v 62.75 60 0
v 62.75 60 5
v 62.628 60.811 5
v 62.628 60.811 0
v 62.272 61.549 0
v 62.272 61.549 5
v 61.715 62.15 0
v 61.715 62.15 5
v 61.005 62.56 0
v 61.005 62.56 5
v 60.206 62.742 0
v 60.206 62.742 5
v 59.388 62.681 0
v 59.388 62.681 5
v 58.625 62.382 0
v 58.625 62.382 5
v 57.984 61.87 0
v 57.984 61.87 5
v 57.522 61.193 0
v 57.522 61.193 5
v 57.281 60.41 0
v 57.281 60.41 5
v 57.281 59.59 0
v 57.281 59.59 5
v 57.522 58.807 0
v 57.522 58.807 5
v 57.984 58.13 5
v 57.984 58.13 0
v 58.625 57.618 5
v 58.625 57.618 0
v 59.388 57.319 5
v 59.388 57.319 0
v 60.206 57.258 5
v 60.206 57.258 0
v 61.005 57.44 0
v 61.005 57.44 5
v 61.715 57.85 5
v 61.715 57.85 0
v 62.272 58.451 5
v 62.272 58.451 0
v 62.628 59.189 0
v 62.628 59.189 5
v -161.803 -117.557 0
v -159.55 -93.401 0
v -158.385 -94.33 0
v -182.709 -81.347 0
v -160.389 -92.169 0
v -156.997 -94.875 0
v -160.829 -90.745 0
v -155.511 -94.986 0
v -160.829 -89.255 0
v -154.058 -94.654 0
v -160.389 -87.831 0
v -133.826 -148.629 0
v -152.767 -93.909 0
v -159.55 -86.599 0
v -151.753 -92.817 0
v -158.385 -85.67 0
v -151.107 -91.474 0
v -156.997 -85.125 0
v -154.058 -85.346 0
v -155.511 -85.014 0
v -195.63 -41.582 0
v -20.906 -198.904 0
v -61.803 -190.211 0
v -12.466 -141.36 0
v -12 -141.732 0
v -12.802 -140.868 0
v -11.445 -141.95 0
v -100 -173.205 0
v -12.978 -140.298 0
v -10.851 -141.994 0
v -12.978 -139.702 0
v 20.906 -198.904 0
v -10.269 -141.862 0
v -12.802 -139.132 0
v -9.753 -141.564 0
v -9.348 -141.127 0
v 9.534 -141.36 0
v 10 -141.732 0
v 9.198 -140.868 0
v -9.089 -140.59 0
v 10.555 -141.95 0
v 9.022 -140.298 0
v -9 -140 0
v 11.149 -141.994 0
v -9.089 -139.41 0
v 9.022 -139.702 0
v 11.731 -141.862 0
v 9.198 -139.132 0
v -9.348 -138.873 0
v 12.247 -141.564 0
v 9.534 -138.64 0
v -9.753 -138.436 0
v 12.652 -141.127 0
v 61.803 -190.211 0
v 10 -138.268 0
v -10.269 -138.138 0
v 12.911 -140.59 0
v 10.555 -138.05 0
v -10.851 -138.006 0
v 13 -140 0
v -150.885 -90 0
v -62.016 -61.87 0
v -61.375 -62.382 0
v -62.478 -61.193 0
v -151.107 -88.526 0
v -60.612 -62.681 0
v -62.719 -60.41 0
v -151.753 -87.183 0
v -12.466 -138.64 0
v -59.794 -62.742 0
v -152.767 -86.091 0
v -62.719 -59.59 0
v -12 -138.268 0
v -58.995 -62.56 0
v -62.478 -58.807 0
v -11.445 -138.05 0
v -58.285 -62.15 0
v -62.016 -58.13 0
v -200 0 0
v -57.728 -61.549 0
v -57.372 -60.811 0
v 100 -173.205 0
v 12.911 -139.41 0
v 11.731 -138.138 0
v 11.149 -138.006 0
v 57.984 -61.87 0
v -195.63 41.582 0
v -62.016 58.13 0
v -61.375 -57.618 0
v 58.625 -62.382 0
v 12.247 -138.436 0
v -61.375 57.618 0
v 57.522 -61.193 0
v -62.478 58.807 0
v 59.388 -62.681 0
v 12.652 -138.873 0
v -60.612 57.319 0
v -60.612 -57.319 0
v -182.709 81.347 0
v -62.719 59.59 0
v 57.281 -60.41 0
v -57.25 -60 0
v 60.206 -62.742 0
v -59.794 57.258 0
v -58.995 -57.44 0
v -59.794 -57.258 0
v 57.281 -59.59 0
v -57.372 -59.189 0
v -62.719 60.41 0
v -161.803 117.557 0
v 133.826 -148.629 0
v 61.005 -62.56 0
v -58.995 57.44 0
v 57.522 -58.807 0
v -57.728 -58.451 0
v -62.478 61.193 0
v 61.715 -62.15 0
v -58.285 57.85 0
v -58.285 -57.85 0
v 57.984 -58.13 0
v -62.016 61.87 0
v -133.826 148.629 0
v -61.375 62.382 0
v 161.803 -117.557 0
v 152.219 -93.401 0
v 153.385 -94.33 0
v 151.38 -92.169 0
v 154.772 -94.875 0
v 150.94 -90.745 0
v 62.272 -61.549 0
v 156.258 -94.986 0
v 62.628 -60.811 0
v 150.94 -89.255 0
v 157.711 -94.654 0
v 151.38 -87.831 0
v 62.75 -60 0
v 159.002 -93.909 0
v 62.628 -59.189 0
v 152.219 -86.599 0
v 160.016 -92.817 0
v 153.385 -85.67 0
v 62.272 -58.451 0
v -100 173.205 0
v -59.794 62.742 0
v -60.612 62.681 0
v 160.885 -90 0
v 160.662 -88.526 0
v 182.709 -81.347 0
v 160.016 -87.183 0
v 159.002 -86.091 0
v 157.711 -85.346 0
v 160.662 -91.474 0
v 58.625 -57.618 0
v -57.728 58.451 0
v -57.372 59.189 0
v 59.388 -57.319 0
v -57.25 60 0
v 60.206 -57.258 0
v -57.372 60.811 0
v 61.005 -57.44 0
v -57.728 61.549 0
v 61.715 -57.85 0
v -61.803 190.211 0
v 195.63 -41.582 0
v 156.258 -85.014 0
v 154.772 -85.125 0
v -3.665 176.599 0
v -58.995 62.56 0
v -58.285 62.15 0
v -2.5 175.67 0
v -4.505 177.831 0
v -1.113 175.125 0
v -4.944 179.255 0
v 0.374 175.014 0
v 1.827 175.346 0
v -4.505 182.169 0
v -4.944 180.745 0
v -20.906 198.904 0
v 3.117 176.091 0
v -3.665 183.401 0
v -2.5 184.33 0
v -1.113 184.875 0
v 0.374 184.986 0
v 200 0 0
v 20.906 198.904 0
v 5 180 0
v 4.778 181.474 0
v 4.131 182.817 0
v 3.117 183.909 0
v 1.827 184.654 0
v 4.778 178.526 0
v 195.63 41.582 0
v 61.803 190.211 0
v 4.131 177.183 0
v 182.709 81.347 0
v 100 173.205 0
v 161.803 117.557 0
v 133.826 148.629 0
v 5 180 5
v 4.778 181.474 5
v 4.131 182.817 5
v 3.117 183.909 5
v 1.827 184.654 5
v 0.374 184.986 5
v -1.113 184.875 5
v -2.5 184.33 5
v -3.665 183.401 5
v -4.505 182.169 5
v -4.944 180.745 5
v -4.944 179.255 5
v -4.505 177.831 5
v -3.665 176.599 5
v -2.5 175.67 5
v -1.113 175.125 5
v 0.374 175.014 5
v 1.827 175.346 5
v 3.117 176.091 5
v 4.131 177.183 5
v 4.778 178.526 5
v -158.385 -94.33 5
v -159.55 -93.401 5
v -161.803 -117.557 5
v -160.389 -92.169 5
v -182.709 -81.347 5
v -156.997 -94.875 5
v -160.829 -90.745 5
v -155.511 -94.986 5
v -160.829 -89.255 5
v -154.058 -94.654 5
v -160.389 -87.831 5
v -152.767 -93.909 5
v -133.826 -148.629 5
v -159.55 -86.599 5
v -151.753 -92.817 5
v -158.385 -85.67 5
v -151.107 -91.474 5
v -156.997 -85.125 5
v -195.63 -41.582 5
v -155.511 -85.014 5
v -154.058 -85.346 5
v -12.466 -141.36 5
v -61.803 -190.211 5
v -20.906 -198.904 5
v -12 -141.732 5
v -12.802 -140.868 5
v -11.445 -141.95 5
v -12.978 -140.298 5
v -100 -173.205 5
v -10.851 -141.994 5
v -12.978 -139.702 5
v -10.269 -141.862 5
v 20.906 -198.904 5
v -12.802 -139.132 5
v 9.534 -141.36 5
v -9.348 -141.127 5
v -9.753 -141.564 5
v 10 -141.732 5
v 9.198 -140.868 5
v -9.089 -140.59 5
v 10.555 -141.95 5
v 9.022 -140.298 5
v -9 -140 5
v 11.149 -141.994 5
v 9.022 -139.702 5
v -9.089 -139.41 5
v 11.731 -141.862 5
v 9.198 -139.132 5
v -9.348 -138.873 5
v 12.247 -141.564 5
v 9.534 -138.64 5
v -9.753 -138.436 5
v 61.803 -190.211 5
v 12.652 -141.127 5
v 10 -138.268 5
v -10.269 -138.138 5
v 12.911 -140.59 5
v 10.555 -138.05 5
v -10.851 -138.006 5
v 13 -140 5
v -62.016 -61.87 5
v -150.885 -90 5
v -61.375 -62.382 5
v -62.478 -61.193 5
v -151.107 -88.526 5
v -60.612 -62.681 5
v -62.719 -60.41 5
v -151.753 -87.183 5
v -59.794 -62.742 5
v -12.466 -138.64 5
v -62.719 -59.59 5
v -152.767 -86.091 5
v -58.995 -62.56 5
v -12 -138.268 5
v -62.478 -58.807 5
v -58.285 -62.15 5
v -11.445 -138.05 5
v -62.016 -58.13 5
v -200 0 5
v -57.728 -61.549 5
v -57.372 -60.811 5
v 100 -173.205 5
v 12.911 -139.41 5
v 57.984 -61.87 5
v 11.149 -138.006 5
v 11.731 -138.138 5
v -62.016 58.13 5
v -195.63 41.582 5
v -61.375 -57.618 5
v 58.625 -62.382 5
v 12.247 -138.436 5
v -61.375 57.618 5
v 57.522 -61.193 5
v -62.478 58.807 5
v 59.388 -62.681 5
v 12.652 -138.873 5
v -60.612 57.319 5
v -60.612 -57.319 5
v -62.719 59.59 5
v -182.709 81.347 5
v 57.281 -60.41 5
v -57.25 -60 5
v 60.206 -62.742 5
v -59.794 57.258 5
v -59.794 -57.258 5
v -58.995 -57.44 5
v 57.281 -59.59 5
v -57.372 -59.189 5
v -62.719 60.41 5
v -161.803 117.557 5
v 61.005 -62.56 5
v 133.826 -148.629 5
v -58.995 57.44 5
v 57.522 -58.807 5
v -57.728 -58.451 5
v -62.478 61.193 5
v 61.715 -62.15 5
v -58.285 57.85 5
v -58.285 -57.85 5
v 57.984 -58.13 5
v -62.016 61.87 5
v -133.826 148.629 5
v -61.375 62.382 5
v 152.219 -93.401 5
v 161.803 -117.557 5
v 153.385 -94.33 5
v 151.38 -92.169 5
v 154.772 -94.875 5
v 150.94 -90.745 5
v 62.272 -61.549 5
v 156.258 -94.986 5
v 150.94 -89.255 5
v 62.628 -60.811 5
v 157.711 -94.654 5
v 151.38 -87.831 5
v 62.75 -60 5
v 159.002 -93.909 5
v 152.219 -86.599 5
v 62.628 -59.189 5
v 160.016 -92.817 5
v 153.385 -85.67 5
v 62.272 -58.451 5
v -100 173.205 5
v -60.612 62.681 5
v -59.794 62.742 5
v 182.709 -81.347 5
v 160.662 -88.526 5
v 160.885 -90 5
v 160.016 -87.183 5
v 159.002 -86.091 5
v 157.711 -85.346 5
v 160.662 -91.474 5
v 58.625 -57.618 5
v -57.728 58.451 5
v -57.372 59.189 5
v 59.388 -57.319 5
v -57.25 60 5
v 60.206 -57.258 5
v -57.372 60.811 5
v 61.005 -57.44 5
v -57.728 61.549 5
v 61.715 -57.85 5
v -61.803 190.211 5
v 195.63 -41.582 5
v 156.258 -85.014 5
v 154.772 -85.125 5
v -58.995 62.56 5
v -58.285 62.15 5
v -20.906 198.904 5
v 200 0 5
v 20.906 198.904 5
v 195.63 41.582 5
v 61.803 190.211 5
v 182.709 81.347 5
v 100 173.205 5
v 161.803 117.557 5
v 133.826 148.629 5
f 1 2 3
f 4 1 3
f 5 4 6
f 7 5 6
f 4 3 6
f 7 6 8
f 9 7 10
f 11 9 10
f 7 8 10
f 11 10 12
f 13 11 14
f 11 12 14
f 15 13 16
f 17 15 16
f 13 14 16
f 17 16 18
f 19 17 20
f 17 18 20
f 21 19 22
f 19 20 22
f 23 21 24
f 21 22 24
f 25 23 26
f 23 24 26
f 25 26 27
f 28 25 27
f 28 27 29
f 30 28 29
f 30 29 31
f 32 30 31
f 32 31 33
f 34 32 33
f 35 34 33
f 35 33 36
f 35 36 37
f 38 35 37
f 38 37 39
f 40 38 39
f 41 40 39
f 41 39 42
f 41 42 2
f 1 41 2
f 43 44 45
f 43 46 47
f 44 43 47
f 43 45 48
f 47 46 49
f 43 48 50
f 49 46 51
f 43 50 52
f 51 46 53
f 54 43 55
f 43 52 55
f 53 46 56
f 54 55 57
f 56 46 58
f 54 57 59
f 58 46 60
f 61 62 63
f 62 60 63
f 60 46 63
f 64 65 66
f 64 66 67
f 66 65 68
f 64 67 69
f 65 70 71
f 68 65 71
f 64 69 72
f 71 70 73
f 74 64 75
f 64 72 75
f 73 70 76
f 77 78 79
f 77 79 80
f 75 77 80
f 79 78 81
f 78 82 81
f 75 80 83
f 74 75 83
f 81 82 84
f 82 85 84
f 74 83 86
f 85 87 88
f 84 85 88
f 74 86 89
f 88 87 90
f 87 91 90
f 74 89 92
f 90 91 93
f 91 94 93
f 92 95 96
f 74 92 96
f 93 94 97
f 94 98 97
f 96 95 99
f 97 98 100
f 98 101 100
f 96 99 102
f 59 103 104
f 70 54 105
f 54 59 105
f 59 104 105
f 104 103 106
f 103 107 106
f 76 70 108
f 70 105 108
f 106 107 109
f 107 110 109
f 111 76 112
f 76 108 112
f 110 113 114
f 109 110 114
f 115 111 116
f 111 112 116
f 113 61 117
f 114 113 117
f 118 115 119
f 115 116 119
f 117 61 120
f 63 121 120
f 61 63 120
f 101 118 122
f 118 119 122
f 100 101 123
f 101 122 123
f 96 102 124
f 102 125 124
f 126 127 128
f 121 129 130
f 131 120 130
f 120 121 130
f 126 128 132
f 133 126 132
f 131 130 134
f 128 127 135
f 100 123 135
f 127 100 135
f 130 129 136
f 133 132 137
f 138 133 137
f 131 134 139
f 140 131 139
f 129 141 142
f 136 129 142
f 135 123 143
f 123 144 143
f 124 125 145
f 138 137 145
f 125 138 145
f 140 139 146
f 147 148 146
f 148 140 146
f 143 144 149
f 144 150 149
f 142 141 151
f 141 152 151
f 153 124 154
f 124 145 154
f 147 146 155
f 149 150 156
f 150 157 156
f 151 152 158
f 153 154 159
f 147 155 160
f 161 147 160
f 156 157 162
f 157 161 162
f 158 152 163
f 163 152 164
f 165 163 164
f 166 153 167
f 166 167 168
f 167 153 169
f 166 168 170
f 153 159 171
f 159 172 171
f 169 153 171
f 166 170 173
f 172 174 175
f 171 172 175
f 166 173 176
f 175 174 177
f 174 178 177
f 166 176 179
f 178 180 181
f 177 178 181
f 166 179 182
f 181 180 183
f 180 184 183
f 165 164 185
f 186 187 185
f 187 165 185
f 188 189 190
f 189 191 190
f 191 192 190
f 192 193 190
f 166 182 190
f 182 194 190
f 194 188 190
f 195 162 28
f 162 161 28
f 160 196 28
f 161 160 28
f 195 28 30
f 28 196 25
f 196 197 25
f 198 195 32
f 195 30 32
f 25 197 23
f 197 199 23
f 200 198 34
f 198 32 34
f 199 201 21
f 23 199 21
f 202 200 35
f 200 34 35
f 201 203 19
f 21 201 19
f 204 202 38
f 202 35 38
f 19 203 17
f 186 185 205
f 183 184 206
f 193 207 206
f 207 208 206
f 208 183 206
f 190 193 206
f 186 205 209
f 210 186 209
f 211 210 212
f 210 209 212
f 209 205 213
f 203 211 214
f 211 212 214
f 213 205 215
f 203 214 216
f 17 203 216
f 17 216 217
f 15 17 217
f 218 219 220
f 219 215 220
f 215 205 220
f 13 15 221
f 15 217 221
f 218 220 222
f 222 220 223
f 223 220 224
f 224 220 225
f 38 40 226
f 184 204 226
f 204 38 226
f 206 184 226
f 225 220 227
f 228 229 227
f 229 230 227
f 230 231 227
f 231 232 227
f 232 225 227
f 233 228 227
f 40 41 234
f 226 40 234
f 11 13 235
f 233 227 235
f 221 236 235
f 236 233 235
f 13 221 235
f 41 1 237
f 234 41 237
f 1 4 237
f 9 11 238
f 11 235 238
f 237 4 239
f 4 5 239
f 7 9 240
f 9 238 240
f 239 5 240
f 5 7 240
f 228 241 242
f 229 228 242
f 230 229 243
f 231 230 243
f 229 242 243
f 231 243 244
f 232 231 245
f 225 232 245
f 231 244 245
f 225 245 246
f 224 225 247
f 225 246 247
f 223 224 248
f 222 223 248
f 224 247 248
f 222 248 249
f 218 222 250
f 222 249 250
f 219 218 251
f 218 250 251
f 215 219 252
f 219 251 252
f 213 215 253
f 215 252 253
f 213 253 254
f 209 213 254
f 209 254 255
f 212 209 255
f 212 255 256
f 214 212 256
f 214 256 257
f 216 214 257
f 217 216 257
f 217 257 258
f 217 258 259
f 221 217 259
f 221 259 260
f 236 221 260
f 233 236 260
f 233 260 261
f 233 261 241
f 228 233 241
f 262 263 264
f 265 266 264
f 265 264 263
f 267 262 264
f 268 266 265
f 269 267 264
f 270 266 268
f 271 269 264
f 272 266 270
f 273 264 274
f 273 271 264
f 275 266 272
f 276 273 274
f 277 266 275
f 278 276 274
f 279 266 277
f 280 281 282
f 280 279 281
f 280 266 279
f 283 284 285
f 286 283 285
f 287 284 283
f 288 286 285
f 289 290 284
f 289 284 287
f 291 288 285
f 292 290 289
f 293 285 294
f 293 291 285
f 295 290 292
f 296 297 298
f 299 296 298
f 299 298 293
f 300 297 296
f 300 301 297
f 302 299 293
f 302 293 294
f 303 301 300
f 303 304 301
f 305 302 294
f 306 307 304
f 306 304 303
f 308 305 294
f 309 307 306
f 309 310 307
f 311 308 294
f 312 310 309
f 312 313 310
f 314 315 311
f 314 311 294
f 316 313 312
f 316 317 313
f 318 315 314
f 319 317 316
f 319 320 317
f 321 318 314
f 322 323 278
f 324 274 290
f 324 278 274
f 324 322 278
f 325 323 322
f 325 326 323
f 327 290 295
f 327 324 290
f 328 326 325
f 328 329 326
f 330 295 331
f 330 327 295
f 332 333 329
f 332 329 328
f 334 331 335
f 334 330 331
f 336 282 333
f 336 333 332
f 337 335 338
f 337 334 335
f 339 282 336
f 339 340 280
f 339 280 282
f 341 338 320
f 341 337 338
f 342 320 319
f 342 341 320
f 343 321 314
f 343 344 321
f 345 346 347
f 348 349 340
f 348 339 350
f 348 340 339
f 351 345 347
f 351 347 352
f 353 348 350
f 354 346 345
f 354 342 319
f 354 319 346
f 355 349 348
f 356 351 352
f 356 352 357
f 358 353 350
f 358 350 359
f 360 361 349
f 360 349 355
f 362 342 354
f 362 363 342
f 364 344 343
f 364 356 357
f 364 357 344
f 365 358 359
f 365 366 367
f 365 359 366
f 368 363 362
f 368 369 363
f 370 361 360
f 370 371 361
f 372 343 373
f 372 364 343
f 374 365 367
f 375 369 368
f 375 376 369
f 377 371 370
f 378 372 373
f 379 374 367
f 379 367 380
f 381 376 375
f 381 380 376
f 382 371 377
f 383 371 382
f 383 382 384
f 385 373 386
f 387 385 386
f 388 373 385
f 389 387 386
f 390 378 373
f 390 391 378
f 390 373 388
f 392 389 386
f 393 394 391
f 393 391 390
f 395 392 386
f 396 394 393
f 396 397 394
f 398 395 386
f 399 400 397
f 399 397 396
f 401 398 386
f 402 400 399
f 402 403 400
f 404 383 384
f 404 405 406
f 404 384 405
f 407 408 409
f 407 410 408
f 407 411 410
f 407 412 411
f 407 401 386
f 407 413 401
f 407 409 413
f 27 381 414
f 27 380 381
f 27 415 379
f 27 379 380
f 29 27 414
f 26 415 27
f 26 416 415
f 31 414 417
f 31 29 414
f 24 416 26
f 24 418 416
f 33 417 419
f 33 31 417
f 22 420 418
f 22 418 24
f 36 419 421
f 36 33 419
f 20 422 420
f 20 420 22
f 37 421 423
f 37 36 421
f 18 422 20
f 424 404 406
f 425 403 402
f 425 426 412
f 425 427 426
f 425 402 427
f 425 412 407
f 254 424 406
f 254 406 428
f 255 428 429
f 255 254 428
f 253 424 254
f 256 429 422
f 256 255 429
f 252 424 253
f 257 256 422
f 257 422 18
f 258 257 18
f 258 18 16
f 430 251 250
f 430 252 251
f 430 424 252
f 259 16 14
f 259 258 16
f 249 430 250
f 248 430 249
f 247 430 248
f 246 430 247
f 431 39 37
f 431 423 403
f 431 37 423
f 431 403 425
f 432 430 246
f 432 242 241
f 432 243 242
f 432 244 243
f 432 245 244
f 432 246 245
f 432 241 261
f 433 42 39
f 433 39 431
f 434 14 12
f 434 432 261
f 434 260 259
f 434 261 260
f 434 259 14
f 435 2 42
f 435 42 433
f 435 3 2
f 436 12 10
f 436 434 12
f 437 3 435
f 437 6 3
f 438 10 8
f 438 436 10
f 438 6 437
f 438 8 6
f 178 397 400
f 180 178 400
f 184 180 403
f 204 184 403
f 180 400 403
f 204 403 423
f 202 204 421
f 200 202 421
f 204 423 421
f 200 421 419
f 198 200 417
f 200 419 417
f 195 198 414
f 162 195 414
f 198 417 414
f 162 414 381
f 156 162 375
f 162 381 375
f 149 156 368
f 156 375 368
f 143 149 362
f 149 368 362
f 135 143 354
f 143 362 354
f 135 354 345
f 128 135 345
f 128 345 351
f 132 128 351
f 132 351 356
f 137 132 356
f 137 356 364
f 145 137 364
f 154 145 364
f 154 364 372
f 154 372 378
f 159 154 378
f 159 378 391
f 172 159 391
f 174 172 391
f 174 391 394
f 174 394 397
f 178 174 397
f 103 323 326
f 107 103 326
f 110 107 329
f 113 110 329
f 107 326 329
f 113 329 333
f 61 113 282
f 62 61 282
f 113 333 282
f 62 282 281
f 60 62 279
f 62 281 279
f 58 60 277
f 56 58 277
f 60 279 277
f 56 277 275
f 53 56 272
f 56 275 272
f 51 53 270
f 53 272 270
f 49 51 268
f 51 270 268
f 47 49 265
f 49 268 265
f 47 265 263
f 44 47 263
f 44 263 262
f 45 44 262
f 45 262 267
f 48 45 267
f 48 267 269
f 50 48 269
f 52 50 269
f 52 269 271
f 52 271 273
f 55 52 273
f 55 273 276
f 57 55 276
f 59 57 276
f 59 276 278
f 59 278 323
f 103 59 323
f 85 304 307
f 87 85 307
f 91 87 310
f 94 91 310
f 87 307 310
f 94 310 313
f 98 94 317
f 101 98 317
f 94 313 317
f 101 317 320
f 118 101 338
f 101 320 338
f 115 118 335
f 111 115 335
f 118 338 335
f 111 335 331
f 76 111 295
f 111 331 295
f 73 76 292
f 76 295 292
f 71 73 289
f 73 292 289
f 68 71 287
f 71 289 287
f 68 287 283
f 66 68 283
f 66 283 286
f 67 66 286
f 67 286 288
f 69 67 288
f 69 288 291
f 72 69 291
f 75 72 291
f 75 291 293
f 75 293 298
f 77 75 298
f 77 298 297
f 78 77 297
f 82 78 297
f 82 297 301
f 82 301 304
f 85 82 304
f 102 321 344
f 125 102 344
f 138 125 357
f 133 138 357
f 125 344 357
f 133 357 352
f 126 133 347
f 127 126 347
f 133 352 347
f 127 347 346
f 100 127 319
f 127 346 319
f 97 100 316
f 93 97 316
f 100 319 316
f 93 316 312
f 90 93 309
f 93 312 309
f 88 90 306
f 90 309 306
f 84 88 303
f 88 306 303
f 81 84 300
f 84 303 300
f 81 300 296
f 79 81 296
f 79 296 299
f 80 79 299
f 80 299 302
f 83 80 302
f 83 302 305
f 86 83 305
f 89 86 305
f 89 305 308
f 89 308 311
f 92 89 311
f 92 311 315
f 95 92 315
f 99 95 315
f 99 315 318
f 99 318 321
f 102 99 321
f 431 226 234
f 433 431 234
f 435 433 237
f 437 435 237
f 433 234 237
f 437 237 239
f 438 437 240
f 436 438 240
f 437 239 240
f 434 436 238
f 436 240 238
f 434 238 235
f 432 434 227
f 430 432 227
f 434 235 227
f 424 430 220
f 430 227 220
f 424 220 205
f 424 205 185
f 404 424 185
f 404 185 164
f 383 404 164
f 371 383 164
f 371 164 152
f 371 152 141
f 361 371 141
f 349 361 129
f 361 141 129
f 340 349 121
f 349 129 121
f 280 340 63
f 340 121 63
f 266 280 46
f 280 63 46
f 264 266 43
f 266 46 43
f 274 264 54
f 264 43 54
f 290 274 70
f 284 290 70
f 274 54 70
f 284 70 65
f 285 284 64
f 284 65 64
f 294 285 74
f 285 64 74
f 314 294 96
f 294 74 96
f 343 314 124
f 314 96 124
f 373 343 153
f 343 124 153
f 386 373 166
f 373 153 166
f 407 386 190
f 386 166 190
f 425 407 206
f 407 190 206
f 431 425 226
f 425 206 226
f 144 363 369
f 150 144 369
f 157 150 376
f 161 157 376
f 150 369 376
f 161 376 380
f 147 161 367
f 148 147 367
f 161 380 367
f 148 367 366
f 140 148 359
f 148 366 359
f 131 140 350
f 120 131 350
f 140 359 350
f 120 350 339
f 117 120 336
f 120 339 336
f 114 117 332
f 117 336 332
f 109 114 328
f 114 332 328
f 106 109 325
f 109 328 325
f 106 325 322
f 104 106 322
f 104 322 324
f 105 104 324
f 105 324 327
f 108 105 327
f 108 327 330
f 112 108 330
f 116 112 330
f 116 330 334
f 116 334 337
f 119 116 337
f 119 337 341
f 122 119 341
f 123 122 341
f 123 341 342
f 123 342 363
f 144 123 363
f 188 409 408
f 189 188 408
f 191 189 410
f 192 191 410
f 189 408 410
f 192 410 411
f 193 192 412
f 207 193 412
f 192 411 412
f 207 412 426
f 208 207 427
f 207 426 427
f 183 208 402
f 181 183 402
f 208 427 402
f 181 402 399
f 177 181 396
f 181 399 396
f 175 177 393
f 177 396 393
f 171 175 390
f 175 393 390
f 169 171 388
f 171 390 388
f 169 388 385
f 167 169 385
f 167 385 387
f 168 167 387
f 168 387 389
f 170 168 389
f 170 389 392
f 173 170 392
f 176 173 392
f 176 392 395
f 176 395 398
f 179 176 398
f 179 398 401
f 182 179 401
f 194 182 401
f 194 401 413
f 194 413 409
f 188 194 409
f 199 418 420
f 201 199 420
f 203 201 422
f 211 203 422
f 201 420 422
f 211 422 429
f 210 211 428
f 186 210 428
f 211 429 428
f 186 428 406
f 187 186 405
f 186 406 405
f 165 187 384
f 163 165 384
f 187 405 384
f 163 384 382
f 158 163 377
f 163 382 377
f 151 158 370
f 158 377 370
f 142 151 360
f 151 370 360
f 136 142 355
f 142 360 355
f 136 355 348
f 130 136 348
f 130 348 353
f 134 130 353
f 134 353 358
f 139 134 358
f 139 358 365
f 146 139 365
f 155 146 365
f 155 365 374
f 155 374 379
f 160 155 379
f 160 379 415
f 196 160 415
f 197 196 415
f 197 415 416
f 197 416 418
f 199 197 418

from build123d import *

# Parameters (mm, degrees)
SKETCH1_R           = 200
BOSS_EXTRUDE1_DEPTH = 5
CUT_EXTRUDE1_REACH  = 7
SKETCH2_R           = 5
CUT_EXTRUDE2_REACH  = 7
SKETCH3_R           = 2.75
CUT_EXTRUDE3_REACH  = 7
SKETCH4_R           = 2


with BuildPart() as part:
    # Sketch1 → Boss-Extrude1 (new body)
    with BuildSketch(Plane.XY):
        Circle(SKETCH1_R)
    extrude(amount=BOSS_EXTRUDE1_DEPTH)

    # Sketch2 → Cut-Extrude1 (cut, up to next)
    with BuildSketch(Plane.XY.offset(5), mode=Mode.PRIVATE) as cut_extrude1_sk1:
        with Locations((0, 180)):
            Circle(SKETCH2_R)
    cut_extrude1_tool1 = extrude(cut_extrude1_sk1.sketch, amount=-CUT_EXTRUDE1_REACH, mode=Mode.PRIVATE) & part.part
    add(cut_extrude1_tool1.solids().sort_by_distance((0, 180, 5))[0], mode=Mode.SUBTRACT)
    # Sketch2 → Cut-Extrude1 (cut, up to next)
    with BuildSketch(Plane.XY.offset(5), mode=Mode.PRIVATE) as cut_extrude1_sk2:
        with Locations((155.884572681, -90)):
            Circle(SKETCH2_R)
    cut_extrude1_tool2 = extrude(cut_extrude1_sk2.sketch, amount=-CUT_EXTRUDE1_REACH, mode=Mode.PRIVATE) & part.part
    add(cut_extrude1_tool2.solids().sort_by_distance((155.884573, -90, 5))[0], mode=Mode.SUBTRACT)
    # Sketch2 → Cut-Extrude1 (cut, up to next)
    with BuildSketch(Plane.XY.offset(5), mode=Mode.PRIVATE) as cut_extrude1_sk3:
        with Locations((-155.884572681, -90)):
            Circle(SKETCH2_R)
    cut_extrude1_tool3 = extrude(cut_extrude1_sk3.sketch, amount=-CUT_EXTRUDE1_REACH, mode=Mode.PRIVATE) & part.part
    add(cut_extrude1_tool3.solids().sort_by_distance((-155.884573, -90, 5))[0], mode=Mode.SUBTRACT)

    # Sketch3 → Cut-Extrude2 (cut, up to next)
    with BuildSketch(Plane.XY.offset(5), mode=Mode.PRIVATE) as cut_extrude2_sk1:
        with Locations((-60, 60)):
            Circle(SKETCH3_R)
    cut_extrude2_tool1 = extrude(cut_extrude2_sk1.sketch, amount=-CUT_EXTRUDE2_REACH, mode=Mode.PRIVATE) & part.part
    add(cut_extrude2_tool1.solids().sort_by_distance((-60, 60, 5))[0], mode=Mode.SUBTRACT)
    # Sketch3 → Cut-Extrude2 (cut, up to next)
    with BuildSketch(Plane.XY.offset(5), mode=Mode.PRIVATE) as cut_extrude2_sk2:
        with Locations((60, 60)):
            Circle(SKETCH3_R)
    cut_extrude2_tool2 = extrude(cut_extrude2_sk2.sketch, amount=-CUT_EXTRUDE2_REACH, mode=Mode.PRIVATE) & part.part
    add(cut_extrude2_tool2.solids().sort_by_distance((60, 60, 5))[0], mode=Mode.SUBTRACT)
    # Sketch3 → Cut-Extrude2 (cut, up to next)
    with BuildSketch(Plane.XY.offset(5), mode=Mode.PRIVATE) as cut_extrude2_sk3:
        with Locations((60, -60)):
            Circle(SKETCH3_R)
    cut_extrude2_tool3 = extrude(cut_extrude2_sk3.sketch, amount=-CUT_EXTRUDE2_REACH, mode=Mode.PRIVATE) & part.part
    add(cut_extrude2_tool3.solids().sort_by_distance((60, -60, 5))[0], mode=Mode.SUBTRACT)
    # Sketch3 → Cut-Extrude2 (cut, up to next)
    with BuildSketch(Plane.XY.offset(5), mode=Mode.PRIVATE) as cut_extrude2_sk4:
        with Locations((-60, -60)):
            Circle(SKETCH3_R)
    cut_extrude2_tool4 = extrude(cut_extrude2_sk4.sketch, amount=-CUT_EXTRUDE2_REACH, mode=Mode.PRIVATE) & part.part
    add(cut_extrude2_tool4.solids().sort_by_distance((-60, -60, 5))[0], mode=Mode.SUBTRACT)

    # Sketch4 → Cut-Extrude3 (cut, up to next)
    with BuildSketch(Plane.XY.offset(5), mode=Mode.PRIVATE) as cut_extrude3_sk1:
        with Locations((11, -140)):
            Circle(SKETCH4_R)
    cut_extrude3_tool1 = extrude(cut_extrude3_sk1.sketch, amount=-CUT_EXTRUDE3_REACH, mode=Mode.PRIVATE) & part.part
    add(cut_extrude3_tool1.solids().sort_by_distance((11, -140, 5))[0], mode=Mode.SUBTRACT)
    # Sketch4 → Cut-Extrude3 (cut, up to next)
    with BuildSketch(Plane.XY.offset(5), mode=Mode.PRIVATE) as cut_extrude3_sk2:
        with Locations((-11, -140)):
            Circle(SKETCH4_R)
    cut_extrude3_tool2 = extrude(cut_extrude3_sk2.sketch, amount=-CUT_EXTRUDE3_REACH, mode=Mode.PRIVATE) & part.part
    add(cut_extrude3_tool2.solids().sort_by_distance((-11, -140, 5))[0], mode=Mode.SUBTRACT)


solid = part.part
